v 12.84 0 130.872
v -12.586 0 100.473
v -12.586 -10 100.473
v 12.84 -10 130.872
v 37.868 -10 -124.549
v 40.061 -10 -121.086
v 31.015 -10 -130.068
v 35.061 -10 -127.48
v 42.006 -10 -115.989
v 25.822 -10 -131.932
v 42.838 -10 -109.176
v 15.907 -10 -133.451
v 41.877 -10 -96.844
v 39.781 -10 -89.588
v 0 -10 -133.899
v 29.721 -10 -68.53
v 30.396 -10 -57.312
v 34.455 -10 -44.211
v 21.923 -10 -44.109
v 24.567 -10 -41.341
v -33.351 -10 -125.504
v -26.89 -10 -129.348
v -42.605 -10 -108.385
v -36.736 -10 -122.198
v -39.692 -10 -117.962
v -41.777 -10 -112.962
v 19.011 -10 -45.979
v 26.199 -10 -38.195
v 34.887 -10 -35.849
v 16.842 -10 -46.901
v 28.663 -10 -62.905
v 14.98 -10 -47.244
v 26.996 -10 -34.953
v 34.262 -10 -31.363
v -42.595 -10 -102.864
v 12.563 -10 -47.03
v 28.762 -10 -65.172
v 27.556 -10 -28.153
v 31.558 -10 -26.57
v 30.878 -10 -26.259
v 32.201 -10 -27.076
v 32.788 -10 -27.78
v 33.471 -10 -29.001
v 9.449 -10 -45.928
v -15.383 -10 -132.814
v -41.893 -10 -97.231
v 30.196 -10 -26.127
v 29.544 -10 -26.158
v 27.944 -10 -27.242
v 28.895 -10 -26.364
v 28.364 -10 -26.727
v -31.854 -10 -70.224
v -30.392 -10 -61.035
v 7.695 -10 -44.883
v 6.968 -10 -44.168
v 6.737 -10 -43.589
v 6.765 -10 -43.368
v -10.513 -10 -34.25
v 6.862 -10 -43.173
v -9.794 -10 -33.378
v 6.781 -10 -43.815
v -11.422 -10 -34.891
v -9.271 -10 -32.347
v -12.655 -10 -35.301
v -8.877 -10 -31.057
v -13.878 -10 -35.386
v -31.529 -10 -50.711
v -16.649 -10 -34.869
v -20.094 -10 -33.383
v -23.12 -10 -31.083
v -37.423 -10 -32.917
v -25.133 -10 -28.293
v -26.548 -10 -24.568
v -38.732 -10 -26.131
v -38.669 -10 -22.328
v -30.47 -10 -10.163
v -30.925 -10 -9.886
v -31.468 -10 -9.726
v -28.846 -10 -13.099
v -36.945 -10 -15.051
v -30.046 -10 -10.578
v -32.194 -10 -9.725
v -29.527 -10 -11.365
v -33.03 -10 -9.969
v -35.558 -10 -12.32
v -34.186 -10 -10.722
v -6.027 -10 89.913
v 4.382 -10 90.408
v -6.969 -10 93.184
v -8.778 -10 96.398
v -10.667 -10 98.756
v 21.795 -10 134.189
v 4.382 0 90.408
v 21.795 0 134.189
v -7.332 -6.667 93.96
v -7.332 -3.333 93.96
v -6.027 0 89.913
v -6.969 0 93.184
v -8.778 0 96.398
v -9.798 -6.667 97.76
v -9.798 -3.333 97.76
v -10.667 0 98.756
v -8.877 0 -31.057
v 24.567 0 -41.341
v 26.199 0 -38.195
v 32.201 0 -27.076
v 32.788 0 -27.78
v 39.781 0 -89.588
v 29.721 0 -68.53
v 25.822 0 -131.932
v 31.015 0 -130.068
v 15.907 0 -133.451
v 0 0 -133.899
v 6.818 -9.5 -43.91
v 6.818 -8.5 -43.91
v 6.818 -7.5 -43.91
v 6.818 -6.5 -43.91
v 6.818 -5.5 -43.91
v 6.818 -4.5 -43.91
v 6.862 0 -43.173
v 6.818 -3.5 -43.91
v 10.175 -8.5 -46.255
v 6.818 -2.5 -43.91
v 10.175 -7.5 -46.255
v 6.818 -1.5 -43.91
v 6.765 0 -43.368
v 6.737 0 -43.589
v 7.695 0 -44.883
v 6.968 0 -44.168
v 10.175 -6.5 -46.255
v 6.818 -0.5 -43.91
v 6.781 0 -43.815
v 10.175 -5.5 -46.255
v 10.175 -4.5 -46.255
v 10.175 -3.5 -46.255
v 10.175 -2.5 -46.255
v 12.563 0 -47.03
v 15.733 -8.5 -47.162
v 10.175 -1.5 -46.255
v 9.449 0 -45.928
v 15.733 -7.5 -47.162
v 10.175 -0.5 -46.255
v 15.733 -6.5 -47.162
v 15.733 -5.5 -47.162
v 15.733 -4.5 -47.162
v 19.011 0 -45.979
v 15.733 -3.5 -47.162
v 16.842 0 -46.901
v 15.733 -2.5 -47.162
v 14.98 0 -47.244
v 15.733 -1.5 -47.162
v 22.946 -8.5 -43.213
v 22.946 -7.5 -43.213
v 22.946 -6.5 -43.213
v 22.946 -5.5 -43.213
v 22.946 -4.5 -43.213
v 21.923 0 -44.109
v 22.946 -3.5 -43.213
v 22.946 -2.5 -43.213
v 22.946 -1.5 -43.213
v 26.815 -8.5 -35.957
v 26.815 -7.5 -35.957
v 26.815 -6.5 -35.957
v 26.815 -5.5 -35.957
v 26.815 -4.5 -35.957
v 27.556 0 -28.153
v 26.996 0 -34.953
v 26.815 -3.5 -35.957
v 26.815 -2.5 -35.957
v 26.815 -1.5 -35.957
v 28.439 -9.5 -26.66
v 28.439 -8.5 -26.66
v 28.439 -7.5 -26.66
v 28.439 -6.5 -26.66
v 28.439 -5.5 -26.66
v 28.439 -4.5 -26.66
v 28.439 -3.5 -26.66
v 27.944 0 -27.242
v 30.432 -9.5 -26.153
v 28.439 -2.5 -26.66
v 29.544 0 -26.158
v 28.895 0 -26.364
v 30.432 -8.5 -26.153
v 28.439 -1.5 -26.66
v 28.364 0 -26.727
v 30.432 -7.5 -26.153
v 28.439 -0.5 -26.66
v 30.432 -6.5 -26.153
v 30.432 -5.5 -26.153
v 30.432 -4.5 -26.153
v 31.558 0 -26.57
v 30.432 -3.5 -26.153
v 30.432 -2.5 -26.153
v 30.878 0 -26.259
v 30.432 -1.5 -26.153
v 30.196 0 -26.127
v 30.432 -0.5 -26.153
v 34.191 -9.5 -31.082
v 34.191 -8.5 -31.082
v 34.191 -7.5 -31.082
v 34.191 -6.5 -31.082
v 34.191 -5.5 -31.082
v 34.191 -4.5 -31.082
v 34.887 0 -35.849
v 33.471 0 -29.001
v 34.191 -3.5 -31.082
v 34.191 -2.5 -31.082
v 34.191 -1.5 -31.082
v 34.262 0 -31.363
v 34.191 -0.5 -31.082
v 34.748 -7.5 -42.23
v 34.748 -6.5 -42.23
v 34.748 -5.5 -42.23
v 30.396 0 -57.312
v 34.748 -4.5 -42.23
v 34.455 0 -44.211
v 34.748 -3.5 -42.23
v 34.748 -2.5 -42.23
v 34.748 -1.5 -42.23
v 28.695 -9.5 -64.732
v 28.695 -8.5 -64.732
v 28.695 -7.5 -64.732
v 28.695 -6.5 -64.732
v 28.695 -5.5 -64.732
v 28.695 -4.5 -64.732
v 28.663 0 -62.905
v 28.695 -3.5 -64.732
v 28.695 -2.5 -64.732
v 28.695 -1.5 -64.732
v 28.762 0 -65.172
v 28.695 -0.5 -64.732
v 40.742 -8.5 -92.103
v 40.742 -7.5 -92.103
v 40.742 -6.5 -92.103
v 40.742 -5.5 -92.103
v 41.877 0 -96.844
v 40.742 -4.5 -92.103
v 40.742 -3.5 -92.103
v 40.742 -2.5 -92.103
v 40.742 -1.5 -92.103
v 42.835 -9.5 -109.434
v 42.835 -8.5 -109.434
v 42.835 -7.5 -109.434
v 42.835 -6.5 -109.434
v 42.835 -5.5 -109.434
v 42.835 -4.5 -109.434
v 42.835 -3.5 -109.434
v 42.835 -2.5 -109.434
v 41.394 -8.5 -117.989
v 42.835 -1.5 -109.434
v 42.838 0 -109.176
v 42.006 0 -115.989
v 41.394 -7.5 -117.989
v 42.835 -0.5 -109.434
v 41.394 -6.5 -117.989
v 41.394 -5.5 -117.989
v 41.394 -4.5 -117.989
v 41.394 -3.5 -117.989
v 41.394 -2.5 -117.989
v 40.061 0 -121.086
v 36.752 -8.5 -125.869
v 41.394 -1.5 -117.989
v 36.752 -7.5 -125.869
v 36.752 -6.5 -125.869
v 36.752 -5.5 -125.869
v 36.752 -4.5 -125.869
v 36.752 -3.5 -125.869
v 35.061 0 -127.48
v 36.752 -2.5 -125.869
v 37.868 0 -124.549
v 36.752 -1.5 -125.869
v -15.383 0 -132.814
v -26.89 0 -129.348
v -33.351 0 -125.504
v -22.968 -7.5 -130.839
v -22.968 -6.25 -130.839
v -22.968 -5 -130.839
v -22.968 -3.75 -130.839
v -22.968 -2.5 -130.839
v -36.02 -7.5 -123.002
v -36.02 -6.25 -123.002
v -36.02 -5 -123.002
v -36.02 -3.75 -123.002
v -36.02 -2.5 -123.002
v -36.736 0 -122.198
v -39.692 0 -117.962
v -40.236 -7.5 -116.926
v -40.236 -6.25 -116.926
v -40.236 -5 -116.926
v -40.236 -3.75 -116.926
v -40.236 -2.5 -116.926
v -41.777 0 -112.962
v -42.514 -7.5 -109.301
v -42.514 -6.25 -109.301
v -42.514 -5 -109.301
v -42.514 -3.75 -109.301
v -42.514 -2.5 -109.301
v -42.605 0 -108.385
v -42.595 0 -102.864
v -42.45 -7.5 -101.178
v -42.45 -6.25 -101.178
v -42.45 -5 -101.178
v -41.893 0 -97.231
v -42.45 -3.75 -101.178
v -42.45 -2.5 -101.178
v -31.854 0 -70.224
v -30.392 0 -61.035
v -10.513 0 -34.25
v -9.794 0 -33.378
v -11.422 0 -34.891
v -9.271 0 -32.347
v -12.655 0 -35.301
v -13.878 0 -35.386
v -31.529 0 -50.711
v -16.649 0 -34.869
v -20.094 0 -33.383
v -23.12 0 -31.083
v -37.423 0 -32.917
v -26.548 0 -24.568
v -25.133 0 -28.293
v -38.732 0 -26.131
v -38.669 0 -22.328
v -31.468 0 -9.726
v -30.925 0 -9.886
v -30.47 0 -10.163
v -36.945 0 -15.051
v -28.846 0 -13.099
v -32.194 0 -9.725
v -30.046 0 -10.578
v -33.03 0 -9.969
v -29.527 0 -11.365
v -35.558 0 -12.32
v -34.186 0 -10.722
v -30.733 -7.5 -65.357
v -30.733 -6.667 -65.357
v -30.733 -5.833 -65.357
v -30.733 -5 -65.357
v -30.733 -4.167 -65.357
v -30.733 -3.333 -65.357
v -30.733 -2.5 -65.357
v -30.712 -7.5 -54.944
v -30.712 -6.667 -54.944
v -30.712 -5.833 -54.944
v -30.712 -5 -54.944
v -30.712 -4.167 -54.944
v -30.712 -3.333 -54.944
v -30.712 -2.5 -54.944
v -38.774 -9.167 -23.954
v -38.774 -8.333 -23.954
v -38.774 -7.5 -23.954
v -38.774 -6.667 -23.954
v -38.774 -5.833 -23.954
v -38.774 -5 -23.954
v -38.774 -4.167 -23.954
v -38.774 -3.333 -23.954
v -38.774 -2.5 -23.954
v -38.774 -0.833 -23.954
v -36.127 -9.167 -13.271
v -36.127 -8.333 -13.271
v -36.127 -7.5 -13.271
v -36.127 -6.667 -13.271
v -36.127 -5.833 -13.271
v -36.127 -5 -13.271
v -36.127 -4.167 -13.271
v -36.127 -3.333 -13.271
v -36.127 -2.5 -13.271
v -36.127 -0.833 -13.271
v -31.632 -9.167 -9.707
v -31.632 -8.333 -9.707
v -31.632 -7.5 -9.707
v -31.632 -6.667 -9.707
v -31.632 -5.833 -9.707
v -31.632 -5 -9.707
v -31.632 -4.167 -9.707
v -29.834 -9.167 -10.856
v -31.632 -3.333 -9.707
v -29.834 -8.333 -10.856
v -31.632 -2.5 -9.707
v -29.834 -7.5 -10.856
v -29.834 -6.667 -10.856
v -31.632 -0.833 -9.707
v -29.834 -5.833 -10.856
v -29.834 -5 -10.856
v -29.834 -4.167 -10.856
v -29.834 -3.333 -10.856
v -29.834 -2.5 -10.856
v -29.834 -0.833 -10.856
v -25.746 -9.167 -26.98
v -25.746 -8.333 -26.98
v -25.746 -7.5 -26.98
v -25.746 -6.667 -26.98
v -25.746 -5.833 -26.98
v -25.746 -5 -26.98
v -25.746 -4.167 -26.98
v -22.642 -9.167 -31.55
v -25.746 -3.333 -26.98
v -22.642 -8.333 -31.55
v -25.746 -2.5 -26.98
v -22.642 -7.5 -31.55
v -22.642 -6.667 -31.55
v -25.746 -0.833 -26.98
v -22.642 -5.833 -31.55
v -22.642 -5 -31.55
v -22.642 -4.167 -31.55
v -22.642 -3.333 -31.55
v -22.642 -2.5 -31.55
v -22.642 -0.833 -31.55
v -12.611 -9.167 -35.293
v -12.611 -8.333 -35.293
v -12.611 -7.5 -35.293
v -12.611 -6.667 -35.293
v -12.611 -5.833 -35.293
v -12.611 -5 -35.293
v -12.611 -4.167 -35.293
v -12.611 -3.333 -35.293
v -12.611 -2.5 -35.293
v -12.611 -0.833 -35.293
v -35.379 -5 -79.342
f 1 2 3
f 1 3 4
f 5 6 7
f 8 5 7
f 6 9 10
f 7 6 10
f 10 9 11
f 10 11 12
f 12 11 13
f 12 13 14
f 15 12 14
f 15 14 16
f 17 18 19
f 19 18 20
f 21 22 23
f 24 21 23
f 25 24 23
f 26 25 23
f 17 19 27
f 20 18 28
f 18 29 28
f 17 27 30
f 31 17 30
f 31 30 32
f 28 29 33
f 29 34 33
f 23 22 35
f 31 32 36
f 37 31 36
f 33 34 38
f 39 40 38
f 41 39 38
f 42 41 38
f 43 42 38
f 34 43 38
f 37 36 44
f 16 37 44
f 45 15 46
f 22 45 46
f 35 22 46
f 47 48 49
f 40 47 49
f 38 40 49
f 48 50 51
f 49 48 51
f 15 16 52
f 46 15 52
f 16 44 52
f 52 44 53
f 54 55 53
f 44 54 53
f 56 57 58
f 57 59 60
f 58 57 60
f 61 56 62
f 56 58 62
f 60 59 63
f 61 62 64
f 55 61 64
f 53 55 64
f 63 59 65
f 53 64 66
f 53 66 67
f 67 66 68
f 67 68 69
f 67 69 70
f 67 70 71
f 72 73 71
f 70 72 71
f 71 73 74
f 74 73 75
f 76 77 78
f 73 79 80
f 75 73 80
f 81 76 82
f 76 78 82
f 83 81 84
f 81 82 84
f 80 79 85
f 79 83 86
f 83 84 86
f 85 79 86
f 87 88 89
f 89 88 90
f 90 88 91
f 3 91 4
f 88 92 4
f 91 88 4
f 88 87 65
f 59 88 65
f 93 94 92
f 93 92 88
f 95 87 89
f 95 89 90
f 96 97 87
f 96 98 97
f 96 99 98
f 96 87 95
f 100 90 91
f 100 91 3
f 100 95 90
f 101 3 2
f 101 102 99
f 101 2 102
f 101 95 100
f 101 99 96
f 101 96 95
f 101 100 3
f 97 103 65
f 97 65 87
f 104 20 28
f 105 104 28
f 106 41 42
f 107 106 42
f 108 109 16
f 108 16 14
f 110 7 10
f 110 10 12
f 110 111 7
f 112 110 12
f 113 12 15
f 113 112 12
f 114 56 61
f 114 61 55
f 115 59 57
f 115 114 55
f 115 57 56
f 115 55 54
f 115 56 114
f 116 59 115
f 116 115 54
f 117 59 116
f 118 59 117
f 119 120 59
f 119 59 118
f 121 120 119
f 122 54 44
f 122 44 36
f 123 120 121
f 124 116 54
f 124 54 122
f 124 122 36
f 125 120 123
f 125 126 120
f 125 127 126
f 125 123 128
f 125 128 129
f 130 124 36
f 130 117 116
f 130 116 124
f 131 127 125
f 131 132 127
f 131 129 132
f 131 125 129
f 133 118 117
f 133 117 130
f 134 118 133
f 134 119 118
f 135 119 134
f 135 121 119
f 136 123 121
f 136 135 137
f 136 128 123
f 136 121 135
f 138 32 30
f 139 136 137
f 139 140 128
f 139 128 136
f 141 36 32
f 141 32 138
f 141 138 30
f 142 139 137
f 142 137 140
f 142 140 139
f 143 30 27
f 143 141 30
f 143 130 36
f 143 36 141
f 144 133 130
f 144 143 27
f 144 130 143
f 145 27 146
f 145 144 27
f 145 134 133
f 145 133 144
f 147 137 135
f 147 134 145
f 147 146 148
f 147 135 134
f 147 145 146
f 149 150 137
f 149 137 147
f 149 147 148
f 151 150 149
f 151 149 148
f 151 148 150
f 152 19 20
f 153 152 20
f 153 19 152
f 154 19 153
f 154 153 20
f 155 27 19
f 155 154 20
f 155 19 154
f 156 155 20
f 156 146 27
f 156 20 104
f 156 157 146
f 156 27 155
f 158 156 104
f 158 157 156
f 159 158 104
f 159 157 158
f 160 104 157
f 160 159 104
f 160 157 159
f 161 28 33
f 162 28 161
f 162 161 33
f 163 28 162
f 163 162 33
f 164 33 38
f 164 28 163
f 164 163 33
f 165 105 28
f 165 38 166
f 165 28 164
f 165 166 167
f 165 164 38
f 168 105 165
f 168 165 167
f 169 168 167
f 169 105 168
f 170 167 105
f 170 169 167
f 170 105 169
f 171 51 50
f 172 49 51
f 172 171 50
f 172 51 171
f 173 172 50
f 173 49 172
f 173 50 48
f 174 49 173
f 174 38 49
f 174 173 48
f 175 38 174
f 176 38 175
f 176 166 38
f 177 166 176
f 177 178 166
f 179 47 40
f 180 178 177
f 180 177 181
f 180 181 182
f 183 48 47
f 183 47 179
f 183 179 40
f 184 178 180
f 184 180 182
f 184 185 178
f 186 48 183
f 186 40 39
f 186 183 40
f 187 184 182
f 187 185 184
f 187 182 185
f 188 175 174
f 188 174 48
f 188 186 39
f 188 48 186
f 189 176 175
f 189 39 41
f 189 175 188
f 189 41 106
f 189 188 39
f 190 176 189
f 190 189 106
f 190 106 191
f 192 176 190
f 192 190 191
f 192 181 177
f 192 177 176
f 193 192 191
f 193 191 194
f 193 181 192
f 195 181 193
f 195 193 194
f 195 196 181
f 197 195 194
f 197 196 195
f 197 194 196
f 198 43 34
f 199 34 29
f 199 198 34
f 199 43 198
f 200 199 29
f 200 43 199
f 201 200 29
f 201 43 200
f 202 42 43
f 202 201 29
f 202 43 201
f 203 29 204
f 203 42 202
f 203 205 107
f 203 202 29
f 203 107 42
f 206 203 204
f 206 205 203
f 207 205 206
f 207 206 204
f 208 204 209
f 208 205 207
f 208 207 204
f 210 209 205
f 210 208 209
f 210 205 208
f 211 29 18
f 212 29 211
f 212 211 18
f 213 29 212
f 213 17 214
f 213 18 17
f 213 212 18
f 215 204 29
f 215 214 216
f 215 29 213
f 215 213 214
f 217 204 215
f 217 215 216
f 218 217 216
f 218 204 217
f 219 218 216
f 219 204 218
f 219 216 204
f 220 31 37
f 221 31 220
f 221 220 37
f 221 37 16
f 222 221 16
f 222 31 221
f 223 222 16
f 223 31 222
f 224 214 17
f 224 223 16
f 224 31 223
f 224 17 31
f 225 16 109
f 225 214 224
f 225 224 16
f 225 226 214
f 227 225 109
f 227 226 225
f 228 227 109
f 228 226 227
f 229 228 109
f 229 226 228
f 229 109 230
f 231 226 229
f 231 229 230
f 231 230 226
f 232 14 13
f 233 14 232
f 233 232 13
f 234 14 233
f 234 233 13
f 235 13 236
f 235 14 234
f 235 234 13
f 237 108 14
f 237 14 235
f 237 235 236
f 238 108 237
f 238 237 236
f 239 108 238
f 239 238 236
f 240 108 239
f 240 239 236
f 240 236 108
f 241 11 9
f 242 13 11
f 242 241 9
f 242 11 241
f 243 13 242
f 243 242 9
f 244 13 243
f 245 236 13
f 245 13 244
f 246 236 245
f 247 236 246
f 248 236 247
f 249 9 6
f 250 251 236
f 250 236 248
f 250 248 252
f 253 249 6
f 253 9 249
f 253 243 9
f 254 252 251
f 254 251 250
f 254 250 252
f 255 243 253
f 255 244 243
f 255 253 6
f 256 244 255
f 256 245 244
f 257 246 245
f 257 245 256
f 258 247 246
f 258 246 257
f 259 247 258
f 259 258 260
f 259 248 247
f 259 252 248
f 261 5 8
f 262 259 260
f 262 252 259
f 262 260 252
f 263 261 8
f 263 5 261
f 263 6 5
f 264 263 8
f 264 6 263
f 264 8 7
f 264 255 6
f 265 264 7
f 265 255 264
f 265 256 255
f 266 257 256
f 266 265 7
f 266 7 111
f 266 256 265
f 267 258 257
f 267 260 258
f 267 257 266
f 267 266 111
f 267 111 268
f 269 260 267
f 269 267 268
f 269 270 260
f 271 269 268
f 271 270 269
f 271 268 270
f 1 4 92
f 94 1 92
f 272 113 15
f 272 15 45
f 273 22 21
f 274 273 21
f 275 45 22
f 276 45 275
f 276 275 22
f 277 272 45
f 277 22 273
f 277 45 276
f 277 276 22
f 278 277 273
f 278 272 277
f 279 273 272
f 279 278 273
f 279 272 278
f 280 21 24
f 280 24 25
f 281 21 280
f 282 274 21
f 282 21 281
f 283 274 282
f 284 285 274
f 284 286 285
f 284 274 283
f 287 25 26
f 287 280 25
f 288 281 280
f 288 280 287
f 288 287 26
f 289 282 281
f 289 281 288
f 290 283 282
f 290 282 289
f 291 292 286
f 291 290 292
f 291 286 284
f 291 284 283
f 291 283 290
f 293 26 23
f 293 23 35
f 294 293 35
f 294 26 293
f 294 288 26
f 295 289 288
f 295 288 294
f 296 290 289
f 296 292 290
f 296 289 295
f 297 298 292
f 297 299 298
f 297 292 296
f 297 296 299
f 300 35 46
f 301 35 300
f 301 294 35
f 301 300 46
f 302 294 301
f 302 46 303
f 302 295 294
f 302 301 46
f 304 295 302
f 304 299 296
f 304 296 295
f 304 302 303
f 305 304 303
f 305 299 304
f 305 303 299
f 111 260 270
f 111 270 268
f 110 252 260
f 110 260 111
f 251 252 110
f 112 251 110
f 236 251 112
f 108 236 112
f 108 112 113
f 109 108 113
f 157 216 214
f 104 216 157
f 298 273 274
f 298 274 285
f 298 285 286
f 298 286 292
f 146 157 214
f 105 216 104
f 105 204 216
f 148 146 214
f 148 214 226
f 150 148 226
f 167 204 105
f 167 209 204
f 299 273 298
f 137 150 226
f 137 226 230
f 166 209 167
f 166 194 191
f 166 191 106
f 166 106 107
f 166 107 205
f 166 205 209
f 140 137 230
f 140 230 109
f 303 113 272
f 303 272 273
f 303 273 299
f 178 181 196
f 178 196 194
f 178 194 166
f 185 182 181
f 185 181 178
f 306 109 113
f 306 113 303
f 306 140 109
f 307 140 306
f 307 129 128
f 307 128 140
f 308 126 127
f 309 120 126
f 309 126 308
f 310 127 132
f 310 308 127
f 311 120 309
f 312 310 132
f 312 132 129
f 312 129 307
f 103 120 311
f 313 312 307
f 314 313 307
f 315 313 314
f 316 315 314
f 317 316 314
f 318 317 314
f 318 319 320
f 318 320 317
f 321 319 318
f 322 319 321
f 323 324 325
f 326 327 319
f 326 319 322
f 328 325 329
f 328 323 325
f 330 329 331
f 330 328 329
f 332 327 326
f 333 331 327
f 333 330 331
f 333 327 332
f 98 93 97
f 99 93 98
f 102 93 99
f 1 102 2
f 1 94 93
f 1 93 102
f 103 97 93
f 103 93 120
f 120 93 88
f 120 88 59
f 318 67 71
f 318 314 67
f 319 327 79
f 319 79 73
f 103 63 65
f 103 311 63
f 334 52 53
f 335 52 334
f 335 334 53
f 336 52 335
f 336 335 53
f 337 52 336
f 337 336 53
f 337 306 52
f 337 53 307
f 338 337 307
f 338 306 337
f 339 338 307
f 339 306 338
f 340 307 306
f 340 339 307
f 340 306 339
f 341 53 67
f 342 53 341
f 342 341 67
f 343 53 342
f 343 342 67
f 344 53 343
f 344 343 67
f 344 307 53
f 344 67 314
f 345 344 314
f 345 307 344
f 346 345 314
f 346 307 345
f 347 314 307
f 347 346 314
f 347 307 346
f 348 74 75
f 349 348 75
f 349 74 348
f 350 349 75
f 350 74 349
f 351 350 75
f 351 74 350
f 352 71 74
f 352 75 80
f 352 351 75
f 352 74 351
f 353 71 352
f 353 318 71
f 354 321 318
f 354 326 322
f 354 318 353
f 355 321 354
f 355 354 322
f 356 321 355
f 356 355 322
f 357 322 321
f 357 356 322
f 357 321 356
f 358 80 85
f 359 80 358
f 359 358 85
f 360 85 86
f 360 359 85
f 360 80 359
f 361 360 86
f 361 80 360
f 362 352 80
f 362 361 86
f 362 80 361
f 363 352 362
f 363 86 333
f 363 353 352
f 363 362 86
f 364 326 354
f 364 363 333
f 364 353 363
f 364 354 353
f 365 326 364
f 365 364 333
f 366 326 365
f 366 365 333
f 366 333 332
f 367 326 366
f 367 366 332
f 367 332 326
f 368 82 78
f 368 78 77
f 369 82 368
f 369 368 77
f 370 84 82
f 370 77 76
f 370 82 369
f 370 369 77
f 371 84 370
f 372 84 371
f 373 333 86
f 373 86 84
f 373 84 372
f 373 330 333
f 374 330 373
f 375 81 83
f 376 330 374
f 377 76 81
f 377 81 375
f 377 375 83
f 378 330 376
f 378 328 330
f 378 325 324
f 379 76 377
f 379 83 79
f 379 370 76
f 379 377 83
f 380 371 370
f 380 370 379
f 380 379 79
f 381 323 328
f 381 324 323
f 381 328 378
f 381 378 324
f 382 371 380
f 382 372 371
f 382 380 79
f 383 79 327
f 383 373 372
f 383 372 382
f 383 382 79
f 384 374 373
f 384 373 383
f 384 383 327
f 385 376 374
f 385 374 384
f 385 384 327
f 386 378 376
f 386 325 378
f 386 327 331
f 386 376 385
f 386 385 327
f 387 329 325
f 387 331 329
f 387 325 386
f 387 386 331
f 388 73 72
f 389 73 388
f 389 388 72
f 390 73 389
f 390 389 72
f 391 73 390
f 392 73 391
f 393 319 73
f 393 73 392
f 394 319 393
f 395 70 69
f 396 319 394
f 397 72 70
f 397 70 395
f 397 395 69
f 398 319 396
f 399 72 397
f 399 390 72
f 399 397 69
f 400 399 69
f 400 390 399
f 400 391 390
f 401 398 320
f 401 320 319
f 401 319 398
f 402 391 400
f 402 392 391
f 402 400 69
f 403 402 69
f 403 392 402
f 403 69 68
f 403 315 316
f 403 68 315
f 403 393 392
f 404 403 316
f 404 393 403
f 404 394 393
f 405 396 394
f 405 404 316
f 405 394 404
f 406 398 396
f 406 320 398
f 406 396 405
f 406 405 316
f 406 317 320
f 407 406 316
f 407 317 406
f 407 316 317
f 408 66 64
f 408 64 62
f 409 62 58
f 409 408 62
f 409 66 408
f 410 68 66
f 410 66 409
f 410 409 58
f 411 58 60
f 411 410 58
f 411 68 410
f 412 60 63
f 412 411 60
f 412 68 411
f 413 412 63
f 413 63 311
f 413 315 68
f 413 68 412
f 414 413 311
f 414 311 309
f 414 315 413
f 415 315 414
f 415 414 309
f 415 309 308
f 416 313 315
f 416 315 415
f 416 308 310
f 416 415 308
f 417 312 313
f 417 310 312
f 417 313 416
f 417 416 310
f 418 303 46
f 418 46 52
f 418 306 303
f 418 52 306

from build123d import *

# Parameters (mm, degrees)
PAD_DEPTH = 10


with BuildPart() as part:
    # Sketch → Pad (new body)
    with BuildSketch(Plane.XZ):
        with BuildLine():
            add(Edge.make_bspline(
                [(0, -133.899), (-9.100484, -134.359207), (-24.996725, -131.246658), (-36.668785, -124.132263), (-44.450165, -110.236946), (-41.8934, -97.2309), (-41.8934, -97.2309)],
                knots=[0, 0, 0, 0, 0.25, 0.5, 0.75, 1, 1, 1, 1], degree=3))
            add(Edge.make_bspline(
                [(-41.8934, -97.2309), (-38.2181, -85.9736), (-32.8823, -73.6346), (-30.3255, -65.9643), (-30.2112, -54.6518), (-33.1014, -45.0919), (-37.1033, -34.6426), (-39.77845, -24.349279), (-36.425293, -11.681814), (-31.283794, -8.552206), (-28.228701, -12.352447), (-26.823006, -28.612843), (-18.954855, -35.074772), (-10.115738, -36.514477), (-8.876923, -31.056993)],
                knots=[0, 0, 0, 0, 0.083333, 0.166667, 0.25, 0.333333, 0.416667, 0.5, 0.583333, 0.666667, 0.75, 0.833333, 0.916667, 1, 1, 1, 1], degree=3))
            Line((-8.876923, -31.056993), (-6.0269, 89.9126))
            add(Edge.make_bspline(
                [(-6.0269, 89.9126), (-6.47154, 93.8032), (-9.91759, 98.5832), (-12.5855, 100.473015)],
                knots=[0, 0, 0, 0, 1, 1, 1, 1], degree=3))
            Line((-12.5855, 100.473015), (12.839501, 130.87207))
            Line((12.839501, 130.87207), (21.794596, 134.188766))
            Line((21.794596, 134.188766), (4.381912, 90.408318))
            Line((4.381912, 90.408318), (6.86221, -43.1733))
            add(Edge.make_bspline(
                [(6.86221, -43.1733), (6.018916, -44.371445), (13.152852, -48.208977), (18.5666, -46.4812), (23.192751, -43.447956), (26.339512, -39.002533), (27.4338, -32.9195), (27.138685, -28.263592), (28.687092, -25.866058), (32.144768, -26.154661), (34.454716, -30.62553), (35.1834, -37.8375), (34.573071, -46.32267), (29.0732, -60.7134), (27.709541, -64.957512), (35.352818, -81.466736), (41.595779, -91.816154), (42.7135, -103.887), (43.2351, -114.990166), (37.646515, -126.837967), (26.692886, -132.873642), (12.7587, -133.917), (0, -133.899)],
                knots=[0, 0, 0, 0, 0.05, 0.1, 0.15, 0.2, 0.25, 0.3, 0.35, 0.4, 0.45, 0.5, 0.55, 0.6, 0.65, 0.7, 0.75, 0.8, 0.85, 0.9, 0.95, 1, 1, 1, 1], degree=3))
        make_face()
    extrude(amount=PAD_DEPTH)


solid = part.part
